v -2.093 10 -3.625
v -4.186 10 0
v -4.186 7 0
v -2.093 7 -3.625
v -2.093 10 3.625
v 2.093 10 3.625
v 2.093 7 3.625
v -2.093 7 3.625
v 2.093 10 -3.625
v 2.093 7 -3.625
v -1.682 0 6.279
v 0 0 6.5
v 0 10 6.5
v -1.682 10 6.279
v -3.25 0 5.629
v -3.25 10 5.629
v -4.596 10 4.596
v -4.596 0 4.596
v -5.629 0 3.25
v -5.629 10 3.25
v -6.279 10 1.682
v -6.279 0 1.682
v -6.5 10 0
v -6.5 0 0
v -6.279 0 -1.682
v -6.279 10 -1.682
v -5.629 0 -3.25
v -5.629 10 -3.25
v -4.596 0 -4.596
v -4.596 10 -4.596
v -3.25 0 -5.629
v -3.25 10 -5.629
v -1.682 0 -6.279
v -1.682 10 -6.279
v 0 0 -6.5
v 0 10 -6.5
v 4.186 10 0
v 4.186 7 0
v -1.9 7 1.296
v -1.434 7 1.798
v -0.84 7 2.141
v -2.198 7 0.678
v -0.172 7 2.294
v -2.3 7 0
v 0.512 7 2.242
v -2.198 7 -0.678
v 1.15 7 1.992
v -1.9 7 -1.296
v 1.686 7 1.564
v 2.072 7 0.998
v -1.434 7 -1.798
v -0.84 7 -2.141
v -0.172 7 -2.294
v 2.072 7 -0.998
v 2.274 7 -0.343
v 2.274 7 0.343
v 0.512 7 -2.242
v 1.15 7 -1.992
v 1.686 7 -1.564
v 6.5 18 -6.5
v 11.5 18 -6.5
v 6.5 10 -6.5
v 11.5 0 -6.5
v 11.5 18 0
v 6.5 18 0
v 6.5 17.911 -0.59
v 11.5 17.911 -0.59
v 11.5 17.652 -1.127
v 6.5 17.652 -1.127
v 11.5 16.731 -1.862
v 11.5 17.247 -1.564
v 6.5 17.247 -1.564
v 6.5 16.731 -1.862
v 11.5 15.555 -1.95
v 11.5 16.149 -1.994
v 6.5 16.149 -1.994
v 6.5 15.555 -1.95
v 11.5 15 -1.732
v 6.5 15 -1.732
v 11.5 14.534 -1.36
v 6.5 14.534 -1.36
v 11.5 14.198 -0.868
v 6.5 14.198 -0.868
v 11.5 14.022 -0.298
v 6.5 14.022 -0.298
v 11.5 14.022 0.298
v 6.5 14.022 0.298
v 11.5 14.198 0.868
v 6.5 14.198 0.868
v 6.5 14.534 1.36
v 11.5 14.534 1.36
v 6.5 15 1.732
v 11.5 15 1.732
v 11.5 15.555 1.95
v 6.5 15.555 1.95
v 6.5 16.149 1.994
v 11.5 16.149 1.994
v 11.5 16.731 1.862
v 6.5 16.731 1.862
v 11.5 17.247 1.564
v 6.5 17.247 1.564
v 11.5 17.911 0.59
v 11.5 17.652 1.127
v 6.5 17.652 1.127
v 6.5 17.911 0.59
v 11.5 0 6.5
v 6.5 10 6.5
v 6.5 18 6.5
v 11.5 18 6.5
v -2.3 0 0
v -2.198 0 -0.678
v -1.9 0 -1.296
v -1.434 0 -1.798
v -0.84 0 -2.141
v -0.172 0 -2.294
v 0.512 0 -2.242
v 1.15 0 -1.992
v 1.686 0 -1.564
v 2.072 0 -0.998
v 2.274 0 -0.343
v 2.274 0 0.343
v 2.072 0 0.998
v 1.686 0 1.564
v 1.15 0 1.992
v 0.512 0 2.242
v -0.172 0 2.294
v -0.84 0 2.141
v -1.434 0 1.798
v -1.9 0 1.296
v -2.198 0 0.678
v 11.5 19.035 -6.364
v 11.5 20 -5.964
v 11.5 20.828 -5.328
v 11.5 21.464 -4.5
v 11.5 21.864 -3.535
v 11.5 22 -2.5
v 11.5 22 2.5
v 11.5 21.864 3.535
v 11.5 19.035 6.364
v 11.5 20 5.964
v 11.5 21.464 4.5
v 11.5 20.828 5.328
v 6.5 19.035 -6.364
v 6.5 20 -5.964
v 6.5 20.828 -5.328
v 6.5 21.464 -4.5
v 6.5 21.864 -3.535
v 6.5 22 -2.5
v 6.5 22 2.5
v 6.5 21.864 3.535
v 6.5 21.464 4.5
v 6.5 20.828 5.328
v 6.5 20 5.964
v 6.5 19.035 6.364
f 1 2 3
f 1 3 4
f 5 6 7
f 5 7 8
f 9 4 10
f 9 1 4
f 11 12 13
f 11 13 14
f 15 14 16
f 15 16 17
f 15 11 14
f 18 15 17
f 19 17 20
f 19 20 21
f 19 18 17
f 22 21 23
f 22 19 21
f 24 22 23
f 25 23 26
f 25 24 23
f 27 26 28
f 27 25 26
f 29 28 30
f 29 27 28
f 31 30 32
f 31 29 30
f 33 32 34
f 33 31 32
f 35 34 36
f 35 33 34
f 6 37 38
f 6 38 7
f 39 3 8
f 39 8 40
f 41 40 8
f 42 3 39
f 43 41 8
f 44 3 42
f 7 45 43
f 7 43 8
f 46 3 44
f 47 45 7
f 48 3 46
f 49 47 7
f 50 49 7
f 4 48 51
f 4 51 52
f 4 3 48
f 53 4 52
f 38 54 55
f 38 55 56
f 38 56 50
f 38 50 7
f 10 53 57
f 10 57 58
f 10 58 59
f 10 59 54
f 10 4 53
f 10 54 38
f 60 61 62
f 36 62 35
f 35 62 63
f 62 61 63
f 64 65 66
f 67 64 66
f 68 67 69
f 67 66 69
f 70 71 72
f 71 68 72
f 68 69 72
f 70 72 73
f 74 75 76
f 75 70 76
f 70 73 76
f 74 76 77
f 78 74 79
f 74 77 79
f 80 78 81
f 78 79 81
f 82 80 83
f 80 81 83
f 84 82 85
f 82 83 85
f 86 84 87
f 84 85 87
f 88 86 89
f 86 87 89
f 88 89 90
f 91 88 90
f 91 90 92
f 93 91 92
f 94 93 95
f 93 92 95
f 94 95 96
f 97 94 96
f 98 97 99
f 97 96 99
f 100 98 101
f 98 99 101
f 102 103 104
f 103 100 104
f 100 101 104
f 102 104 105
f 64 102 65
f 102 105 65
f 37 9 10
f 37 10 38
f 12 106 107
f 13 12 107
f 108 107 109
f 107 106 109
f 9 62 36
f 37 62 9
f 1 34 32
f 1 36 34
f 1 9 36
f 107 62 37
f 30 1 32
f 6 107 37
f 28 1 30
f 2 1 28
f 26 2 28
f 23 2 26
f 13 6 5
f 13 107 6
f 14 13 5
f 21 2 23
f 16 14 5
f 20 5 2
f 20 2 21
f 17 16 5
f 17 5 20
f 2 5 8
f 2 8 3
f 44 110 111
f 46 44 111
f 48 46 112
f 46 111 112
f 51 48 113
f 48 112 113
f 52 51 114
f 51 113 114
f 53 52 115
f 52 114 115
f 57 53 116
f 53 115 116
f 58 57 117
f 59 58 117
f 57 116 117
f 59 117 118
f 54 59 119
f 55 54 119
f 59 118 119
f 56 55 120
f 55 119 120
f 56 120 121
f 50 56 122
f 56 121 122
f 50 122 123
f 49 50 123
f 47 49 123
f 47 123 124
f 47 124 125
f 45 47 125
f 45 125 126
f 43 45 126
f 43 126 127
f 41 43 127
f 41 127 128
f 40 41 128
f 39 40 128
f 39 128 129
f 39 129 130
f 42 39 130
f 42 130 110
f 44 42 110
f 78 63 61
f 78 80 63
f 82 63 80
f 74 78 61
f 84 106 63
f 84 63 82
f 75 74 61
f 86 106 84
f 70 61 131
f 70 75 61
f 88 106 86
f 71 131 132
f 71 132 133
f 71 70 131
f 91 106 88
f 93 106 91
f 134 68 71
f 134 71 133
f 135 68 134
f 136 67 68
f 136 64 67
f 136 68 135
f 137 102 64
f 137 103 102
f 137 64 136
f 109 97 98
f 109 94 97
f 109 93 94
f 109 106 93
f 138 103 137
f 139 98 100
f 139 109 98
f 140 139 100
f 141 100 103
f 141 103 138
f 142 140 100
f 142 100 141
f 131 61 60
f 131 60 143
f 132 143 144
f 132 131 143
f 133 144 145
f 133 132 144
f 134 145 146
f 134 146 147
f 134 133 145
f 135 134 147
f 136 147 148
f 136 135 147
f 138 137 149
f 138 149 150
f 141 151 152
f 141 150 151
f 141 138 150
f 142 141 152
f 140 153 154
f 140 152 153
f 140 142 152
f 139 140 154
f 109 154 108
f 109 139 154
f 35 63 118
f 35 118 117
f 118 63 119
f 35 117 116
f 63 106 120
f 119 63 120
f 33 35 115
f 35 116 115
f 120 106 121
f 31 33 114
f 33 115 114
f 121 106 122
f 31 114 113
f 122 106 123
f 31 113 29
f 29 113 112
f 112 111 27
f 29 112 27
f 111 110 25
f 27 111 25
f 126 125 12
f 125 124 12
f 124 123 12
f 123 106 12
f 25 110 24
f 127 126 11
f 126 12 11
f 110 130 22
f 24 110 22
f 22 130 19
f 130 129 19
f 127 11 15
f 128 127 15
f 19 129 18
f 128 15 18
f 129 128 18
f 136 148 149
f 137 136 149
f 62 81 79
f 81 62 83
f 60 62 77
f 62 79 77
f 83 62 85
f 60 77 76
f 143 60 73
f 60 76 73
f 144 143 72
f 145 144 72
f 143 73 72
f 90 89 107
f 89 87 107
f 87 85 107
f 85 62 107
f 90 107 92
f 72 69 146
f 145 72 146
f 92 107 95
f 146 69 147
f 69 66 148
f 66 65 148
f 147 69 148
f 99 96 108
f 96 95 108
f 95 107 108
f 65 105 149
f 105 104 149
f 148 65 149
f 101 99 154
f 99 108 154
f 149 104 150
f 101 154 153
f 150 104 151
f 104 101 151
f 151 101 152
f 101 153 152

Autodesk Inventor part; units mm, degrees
ref_plane "XZ Plane" through (0, 0, 0) normal (0, 1, 0) x (-1, 0, 0)
ref_plane "XY Plane" through (0, 0, 0) normal (0, 0, 1) x (1, 0, 0)
sketch "Sketch1" plane through (0, 0, 0) normal (0, 1, 0) x (-1, 0, 0)
  circle A0 centre (0, 0) radius 6.5
  circle A1 centre (0, 0) radius 2.3
  dimension "d0" = 13
  dimension "d1" = 4.6
extrude "Extrusion1" add sketch "Sketch1" along normal blind 10
sketch "Sketch2" plane through (0, 10, 0) normal (0, 1, 0) x (1, 0, 0)
  point P0 (0, 0)
ref_plane "Work Plane1" through (6.5, 0, 0) normal (1, 0, 0) x (0, 1, 0)
sketch "Sketch3" plane through (6.5, 0, 0) normal (1, 0, 0) x (0, 1, 0)
  line L0 (10, -6.5) -> (10, 6.5) projected
  line L1 (10, -6.5) -> (22, -6.5)
  line L2 (22, -6.5) -> (22, 6.5)
  line L3 (22, 6.5) -> (10, 6.5)
  line L4 (10, 6.5) -> (10, -6.5)
  line L5 (0, -6.5) -> (0, 6.5) projected
  line L6 (10, -6.5) -> (0, -6.5)
  line L7 (0, -6.5) -> (0, 6.5)
  line L8 (0, 6.5) -> (10, 6.5)
  line L9 (10, 6.5) -> (10, -6.5)
  circle A0 centre (16, 0) radius 2
  point P0 (0, 0)
  point P1 (0, -6.5)
  point P2 (10, 6.5)
  point P3 (10, 6.5)
  dimension "d5" = 12
  dimension "d6" = 4
  dimension "d11" = 6
extrude "Extrusion2" add sketch "Sketch3" against normal up to surface contours L6 L5 L8 L0
extrude "Extrusion3" add sketch "Sketch3" along normal blind 5
sketch "Sketch5" plane through (0, 10, 0) normal (0, 1, 0) x (1, 0, 0)
  line L0 (4.1858, 0) -> (2.0929, -3.625)
  line L1 (2.0929, -3.625) -> (-2.0929, -3.625)
  line L2 (-2.0929, -3.625) -> (-4.1858, 0)
  line L3 (-4.1858, 0) -> (-2.0929, 3.625)
  line L4 (-2.0929, 3.625) -> (2.0929, 3.625)
  line L5 (2.0929, 3.625) -> (4.1858, 0)
  point P0 (0, 0)
  point P1 (0, 0)
  dimension "d12" = 7.25
extrude "Extrusion4" cut sketch "Sketch5" against normal blind 3
fillet "Fillet1" radius 4 2 edges at (9, 22, 6.5) (9, 22, -6.5)
properties part number "SpringConn"
